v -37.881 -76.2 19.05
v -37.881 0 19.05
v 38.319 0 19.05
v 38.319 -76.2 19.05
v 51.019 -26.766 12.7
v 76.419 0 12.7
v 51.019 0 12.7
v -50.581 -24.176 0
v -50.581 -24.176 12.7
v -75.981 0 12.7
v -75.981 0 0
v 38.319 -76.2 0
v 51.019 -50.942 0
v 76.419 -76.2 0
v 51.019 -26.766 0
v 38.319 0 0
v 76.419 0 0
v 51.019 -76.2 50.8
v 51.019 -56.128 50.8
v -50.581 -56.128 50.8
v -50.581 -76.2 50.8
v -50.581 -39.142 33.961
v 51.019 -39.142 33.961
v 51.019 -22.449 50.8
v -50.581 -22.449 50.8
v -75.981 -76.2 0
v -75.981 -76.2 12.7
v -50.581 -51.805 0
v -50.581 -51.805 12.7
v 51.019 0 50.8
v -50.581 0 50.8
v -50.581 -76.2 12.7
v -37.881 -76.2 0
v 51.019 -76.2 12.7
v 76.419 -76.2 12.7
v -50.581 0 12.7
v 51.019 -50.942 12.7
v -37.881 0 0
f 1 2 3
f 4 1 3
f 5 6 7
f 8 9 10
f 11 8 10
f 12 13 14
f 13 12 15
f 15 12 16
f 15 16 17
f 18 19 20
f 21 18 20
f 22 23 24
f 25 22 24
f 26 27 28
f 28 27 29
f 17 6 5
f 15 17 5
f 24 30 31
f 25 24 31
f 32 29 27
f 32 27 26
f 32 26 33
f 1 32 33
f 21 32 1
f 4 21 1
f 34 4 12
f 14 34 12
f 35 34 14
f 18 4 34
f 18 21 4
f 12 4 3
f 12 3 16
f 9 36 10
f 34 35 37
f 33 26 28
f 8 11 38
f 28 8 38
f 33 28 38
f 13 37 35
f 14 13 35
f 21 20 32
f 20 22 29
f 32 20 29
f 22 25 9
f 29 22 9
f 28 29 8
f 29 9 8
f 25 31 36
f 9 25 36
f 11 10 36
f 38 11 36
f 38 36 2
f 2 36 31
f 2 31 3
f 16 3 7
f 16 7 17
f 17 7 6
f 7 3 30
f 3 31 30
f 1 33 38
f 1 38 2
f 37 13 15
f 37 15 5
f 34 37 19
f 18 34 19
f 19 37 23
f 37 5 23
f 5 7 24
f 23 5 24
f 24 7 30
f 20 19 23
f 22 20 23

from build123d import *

# Parameters (mm, degrees)
F1_DEPTH = 76.2
F3_DEPTH = 12.7
F5_DEPTH = 12.7
F7_DEPTH = 101.6


with BuildPart() as f1:
    # F0 (on Front) → F1 (new body)
    with BuildSketch(Plane.XZ):
        Polygon((-75.980723, 12.7), (-75.980723, 0), (-37.880723, 0), (-37.880723, 19.05), (38.319277, 19.05), (38.319277, 0), (76.419277, 0), (76.419277, 12.7), (51.019277, 12.7), (51.019277, 50.8), (-50.580723, 50.8), (-50.580723, 12.7), align=None)
    extrude(amount=F1_DEPTH)

    # F2 (on face) → F3 (cut, through all)
    with BuildSketch(Plane.XY.offset(12.7)):
        Polygon((51.019277, -50.941616), (76.419277, -76.2), (76.419277, 0), (51.019277, -26.765935), align=None)
    extrude(amount=-F3_DEPTH, mode=Mode.SUBTRACT)

    # F4 (on face) → F5 (cut, through all)
    with BuildSketch(Plane.XY.offset(12.7)):
        Polygon((-75.980723, 0), (-75.980723, -76.2), (-50.580723, -51.805038), (-50.580723, -24.175685), align=None)
    extrude(amount=-F5_DEPTH, mode=Mode.SUBTRACT)

    # F6 (on face) → F7 (cut, through all)
    with BuildSketch(Plane.YZ.offset(51.019277)):
        Polygon((-56.127969, 50.8), (-39.141584, 33.96108), (-22.448849, 50.8), align=None)
    extrude(amount=-F7_DEPTH, mode=Mode.SUBTRACT)


solid = f1.part
